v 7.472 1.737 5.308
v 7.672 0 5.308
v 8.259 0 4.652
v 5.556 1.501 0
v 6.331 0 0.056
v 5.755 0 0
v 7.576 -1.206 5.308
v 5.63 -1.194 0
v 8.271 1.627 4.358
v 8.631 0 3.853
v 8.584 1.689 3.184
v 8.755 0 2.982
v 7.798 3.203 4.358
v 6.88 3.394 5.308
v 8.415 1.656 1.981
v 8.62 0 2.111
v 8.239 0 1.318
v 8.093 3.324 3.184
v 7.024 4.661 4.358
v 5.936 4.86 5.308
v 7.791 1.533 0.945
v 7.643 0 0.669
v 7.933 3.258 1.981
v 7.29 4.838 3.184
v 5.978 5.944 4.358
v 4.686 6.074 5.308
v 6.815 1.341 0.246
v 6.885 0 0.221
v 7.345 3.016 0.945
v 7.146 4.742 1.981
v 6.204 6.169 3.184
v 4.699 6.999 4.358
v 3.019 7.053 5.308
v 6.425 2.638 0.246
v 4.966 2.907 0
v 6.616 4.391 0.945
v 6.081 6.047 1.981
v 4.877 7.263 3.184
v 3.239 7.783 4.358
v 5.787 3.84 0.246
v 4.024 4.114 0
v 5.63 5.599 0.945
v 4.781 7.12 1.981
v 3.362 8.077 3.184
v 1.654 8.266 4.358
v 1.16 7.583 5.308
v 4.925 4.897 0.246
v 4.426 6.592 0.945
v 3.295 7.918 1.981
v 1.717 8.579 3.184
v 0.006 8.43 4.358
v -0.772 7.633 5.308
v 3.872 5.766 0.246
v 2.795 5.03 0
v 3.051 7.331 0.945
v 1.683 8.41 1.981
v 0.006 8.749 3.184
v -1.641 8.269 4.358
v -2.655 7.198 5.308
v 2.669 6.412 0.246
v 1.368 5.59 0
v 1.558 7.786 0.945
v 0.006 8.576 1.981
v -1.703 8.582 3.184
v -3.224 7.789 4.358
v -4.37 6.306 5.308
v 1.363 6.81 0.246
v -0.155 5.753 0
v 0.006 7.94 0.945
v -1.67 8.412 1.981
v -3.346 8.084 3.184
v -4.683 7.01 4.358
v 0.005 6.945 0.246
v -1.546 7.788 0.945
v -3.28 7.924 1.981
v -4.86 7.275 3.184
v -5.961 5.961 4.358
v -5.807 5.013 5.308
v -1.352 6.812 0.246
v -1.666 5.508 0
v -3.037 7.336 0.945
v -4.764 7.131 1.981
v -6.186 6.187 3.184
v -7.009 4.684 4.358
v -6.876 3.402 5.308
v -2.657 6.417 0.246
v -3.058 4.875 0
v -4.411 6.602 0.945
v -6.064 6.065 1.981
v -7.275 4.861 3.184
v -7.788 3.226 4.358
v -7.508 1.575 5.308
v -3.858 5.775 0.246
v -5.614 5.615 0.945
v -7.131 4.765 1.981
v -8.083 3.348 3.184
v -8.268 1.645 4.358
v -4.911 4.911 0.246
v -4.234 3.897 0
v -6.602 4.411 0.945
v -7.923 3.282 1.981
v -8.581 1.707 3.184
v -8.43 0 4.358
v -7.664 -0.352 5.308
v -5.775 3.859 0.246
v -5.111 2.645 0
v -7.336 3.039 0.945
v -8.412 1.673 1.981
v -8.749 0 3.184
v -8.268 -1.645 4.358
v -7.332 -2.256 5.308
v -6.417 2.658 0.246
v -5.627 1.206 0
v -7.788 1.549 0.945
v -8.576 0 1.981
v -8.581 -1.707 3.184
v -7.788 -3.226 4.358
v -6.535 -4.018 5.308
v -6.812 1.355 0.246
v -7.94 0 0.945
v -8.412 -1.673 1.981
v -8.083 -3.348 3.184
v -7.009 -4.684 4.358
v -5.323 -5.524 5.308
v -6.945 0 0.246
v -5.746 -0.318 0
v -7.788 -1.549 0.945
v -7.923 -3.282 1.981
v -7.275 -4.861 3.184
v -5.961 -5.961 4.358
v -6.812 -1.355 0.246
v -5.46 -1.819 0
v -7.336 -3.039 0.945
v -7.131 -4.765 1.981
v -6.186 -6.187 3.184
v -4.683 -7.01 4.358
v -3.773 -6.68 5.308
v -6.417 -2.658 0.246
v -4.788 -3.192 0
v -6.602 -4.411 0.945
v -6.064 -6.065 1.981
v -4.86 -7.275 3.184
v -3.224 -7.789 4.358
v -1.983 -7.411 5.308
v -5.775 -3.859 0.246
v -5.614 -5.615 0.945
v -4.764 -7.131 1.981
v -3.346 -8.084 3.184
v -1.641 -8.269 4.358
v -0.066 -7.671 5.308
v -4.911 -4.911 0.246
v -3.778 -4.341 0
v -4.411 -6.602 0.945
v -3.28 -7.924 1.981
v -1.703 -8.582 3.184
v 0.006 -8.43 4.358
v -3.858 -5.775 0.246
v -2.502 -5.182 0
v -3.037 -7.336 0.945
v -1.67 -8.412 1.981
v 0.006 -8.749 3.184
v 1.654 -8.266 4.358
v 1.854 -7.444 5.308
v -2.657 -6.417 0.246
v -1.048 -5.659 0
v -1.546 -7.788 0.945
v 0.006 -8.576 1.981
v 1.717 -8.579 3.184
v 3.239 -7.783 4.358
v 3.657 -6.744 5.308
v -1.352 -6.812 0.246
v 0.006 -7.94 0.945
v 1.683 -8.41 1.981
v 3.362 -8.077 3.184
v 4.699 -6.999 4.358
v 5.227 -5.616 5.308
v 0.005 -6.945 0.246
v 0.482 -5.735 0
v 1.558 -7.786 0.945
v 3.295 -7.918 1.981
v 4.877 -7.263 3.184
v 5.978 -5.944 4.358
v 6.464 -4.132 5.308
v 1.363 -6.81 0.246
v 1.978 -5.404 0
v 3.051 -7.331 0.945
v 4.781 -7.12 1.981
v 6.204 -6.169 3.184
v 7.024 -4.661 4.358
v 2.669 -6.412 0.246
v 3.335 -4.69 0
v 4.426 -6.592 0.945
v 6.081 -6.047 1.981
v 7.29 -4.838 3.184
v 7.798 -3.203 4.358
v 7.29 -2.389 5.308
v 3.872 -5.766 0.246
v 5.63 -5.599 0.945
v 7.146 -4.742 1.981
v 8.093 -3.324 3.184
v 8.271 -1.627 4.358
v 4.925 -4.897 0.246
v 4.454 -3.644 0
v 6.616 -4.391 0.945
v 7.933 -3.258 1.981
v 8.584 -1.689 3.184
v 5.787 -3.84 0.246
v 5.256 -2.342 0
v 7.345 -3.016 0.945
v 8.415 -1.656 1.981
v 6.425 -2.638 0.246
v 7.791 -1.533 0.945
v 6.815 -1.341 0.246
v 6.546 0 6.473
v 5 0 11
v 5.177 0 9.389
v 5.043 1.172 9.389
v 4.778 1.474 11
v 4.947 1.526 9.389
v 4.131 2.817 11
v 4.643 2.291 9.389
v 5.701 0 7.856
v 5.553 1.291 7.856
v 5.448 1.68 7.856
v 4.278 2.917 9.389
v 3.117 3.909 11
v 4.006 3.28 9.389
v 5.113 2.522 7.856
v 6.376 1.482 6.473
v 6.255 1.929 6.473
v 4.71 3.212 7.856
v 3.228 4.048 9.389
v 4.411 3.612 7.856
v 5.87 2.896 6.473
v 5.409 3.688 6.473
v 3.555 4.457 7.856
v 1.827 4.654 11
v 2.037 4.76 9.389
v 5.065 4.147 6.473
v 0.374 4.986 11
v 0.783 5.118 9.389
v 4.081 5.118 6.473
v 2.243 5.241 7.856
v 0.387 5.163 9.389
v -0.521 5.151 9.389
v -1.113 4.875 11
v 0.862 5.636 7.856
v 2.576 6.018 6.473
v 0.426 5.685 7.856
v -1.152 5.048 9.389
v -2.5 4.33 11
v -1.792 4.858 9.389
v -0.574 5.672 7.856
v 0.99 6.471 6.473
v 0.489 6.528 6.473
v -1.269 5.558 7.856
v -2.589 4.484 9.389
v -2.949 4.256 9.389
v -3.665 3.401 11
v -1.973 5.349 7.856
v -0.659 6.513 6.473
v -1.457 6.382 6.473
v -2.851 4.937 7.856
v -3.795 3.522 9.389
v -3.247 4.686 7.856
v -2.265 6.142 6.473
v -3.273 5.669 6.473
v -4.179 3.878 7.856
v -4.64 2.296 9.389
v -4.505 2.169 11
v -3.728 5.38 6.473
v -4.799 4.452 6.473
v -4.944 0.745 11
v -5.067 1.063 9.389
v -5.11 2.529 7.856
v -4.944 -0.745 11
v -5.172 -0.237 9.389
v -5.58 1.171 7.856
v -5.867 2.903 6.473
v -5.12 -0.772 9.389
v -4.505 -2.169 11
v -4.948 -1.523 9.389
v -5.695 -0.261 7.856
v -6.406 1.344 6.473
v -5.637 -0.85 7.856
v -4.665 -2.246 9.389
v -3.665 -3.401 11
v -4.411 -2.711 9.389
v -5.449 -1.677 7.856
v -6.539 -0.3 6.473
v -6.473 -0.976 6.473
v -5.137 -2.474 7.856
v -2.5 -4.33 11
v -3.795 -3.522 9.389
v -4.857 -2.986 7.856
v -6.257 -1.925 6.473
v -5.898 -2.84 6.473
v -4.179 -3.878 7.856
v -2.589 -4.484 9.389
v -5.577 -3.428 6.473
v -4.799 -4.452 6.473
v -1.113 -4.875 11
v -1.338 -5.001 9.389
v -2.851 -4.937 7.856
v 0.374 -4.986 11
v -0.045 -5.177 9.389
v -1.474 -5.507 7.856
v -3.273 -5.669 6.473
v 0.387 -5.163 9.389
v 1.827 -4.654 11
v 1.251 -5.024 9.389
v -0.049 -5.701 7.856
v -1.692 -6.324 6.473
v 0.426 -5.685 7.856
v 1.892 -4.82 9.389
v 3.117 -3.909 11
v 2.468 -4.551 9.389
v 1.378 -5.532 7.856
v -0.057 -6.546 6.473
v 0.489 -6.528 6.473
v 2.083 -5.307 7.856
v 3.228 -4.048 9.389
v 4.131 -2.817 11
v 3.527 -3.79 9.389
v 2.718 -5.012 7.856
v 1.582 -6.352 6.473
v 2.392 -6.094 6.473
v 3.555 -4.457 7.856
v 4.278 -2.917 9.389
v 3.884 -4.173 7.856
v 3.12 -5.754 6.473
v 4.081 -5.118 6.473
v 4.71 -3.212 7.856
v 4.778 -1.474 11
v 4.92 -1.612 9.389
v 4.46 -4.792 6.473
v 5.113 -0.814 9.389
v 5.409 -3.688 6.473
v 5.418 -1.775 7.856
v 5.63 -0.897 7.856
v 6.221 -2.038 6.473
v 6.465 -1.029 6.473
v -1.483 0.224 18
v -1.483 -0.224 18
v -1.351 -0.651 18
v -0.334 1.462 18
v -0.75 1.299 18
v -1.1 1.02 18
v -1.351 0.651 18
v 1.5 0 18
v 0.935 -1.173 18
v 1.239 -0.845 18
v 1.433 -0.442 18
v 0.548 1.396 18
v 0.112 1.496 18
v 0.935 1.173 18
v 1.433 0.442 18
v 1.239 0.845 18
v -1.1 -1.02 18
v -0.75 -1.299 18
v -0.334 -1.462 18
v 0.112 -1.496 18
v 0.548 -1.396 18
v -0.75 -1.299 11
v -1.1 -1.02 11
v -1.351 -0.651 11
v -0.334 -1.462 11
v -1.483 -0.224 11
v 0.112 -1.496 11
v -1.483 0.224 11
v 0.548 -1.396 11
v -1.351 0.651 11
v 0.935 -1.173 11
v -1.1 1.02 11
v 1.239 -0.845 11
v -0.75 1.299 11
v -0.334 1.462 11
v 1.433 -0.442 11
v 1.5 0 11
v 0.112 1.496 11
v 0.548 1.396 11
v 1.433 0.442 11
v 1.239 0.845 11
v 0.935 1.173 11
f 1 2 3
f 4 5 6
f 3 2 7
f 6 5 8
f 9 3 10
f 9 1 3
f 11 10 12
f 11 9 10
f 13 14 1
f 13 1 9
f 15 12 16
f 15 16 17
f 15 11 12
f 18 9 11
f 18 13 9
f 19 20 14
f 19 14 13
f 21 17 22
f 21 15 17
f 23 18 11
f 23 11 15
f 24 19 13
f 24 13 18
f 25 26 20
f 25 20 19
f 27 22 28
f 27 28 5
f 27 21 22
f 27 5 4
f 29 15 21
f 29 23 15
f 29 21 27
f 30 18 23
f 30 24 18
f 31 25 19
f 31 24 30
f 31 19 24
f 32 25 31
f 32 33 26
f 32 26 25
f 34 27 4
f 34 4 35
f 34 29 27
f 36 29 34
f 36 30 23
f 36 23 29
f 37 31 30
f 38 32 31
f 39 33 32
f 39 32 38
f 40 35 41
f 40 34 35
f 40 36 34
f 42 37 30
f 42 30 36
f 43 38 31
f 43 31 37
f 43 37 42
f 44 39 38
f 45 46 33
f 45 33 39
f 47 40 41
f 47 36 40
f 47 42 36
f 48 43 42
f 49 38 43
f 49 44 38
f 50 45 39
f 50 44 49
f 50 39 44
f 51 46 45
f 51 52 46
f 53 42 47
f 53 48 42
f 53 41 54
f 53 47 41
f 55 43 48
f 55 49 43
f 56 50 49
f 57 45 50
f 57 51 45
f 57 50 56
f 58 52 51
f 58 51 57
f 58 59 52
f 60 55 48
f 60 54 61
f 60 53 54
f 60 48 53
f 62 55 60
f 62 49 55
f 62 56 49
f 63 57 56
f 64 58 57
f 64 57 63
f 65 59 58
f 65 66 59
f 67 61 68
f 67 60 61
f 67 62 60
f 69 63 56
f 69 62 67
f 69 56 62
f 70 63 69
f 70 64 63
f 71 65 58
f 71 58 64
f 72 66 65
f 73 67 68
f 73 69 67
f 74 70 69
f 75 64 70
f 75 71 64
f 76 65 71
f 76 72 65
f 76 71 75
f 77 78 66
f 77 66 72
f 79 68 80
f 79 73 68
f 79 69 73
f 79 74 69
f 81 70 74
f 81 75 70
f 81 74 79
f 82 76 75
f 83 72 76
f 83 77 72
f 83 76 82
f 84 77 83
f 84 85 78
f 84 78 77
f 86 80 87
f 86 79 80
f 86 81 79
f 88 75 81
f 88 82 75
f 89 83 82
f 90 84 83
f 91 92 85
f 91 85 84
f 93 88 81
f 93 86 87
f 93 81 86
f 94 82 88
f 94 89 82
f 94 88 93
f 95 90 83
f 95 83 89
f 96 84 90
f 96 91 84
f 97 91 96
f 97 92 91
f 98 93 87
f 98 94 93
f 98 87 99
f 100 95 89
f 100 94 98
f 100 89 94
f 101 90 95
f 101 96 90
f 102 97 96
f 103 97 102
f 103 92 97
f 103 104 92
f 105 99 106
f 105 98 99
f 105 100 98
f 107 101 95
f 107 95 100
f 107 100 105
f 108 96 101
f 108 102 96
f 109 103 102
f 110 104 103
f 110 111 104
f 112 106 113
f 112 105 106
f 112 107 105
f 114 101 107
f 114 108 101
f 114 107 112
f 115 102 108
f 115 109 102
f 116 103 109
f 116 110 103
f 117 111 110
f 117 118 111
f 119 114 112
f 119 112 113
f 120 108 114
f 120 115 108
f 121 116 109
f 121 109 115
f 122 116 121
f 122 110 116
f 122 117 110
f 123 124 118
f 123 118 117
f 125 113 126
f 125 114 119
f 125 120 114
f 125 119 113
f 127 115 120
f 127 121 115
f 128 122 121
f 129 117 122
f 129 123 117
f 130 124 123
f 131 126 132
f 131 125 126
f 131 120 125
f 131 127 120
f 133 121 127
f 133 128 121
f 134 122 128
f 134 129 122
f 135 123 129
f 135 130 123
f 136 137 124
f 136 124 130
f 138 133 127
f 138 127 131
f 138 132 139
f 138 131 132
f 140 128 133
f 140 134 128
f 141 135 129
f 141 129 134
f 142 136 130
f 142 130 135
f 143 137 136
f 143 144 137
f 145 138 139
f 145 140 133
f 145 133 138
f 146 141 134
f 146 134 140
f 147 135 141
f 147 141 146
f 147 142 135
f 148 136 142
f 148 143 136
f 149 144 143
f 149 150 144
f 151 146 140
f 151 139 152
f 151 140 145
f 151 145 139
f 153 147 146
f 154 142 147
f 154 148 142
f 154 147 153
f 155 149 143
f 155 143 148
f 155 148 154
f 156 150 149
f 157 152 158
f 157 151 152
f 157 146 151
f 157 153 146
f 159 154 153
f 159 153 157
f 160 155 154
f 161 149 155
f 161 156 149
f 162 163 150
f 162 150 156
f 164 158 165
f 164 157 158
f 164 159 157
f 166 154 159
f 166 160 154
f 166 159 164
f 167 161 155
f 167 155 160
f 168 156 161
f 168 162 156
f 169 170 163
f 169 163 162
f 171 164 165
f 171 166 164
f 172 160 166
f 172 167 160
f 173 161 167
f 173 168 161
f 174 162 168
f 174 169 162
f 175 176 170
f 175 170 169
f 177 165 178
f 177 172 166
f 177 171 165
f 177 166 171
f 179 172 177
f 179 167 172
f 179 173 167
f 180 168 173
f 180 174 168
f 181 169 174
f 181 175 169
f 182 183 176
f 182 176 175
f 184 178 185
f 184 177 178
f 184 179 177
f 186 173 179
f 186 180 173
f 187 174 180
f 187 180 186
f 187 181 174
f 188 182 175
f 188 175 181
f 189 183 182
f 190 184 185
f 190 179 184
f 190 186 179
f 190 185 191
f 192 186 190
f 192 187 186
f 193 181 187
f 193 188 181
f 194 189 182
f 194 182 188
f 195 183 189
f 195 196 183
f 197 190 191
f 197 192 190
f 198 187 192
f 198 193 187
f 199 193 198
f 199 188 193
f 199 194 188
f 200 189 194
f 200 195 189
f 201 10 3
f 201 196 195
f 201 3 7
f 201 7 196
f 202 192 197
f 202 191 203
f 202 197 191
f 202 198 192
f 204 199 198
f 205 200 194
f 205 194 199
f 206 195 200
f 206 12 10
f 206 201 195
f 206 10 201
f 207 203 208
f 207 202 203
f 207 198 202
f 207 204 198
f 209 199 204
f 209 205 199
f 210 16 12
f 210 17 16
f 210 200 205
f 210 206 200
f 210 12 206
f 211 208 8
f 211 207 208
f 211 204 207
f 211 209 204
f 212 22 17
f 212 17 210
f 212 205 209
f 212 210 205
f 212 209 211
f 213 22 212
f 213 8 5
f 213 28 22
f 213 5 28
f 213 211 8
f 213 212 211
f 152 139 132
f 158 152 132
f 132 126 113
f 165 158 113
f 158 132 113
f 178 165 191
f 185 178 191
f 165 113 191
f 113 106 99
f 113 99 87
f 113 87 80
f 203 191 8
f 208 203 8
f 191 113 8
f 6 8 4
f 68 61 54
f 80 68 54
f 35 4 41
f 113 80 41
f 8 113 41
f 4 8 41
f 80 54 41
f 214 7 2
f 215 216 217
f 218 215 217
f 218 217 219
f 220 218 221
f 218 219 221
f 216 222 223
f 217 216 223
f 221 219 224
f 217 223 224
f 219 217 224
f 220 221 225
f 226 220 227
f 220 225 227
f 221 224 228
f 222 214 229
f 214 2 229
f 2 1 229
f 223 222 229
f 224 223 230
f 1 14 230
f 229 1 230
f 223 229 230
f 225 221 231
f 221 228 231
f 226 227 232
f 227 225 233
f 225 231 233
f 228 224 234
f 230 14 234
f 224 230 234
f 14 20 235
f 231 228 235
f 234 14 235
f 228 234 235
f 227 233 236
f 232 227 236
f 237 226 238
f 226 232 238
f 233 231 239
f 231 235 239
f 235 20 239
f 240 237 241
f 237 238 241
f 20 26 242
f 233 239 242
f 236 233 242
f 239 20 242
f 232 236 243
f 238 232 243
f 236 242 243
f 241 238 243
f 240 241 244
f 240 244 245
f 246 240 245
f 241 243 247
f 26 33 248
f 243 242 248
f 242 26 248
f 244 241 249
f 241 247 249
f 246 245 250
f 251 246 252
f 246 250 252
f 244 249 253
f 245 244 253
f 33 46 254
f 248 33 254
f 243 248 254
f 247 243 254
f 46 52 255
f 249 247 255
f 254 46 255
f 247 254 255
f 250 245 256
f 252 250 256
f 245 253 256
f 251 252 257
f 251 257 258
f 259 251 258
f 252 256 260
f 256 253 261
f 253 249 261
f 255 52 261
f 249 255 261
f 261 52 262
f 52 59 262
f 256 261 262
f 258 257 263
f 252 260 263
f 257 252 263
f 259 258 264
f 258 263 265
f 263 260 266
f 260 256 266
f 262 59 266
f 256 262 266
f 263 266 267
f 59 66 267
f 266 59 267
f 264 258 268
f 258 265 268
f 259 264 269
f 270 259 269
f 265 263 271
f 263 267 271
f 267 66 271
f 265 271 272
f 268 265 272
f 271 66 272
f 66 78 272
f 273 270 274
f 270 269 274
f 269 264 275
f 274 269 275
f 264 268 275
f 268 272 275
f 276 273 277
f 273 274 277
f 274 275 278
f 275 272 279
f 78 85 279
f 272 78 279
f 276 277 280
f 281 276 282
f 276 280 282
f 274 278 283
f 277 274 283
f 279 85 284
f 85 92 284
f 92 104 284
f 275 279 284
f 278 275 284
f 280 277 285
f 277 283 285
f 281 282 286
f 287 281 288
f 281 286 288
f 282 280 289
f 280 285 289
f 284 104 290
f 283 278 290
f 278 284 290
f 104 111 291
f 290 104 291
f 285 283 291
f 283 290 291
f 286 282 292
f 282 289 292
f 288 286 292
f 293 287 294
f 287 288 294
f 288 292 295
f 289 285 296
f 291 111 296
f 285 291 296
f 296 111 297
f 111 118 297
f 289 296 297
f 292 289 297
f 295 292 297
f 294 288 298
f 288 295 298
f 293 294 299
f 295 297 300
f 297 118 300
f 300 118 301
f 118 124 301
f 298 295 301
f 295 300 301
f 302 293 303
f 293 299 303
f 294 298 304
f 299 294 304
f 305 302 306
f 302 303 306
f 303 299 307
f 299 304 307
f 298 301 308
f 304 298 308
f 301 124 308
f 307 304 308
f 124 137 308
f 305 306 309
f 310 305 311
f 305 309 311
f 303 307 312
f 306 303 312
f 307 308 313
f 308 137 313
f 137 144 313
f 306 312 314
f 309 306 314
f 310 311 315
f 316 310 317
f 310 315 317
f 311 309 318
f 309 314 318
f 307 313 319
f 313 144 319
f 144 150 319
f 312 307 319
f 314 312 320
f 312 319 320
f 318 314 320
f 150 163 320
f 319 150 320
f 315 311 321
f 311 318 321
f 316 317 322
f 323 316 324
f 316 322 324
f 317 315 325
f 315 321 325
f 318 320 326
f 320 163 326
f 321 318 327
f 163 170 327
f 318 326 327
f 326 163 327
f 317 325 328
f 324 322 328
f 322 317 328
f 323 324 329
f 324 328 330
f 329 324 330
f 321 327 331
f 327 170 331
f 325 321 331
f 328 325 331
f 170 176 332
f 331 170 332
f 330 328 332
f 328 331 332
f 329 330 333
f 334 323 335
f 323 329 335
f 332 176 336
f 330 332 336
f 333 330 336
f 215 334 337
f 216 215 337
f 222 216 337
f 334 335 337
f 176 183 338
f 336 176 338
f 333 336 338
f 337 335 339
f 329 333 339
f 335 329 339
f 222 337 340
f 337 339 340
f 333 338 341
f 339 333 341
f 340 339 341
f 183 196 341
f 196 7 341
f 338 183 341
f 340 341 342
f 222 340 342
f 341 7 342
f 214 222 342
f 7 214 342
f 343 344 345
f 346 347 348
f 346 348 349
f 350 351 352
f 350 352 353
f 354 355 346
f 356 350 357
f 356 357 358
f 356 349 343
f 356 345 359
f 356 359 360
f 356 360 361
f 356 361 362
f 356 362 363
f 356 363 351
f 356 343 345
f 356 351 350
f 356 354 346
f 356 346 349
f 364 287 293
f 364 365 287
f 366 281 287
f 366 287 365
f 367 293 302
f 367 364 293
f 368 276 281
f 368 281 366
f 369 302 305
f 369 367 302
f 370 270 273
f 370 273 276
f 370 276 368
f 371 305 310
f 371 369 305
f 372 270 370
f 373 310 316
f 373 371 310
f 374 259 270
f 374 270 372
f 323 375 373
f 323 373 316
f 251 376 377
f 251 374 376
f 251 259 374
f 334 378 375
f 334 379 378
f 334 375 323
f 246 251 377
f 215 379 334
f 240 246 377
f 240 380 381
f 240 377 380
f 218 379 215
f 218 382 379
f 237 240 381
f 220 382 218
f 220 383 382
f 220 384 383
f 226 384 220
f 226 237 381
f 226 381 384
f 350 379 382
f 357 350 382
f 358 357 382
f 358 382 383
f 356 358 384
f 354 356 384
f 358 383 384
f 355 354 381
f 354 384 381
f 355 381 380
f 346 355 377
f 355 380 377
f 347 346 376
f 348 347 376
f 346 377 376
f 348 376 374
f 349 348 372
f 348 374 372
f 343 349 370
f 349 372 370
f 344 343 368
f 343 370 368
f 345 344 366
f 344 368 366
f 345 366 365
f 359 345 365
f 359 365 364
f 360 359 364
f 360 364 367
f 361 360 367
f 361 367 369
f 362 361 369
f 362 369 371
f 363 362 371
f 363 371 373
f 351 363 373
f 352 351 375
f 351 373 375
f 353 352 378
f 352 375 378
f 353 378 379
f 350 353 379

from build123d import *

# Parameters (mm, degrees)
SKETCH1_R           = 10
BOSS_EXTRUDE1_DEPTH = 4
SKETCH2_R           = 5
BOSS_EXTRUDE2_DEPTH = 7
SKETCH3_R           = 1.5
BOSS_EXTRUDE3_DEPTH = 7
FILLET4_R           = 7.4
FILLET15_R          = 4.2
FILLET16_R          = 3


with BuildPart() as part:
    # Sketch1 → Boss-Extrude1 (new body)
    with BuildSketch(Plane.XY):
        Circle(SKETCH1_R)
    extrude(amount=BOSS_EXTRUDE1_DEPTH)

    # Sketch2 → Boss-Extrude2 (add)
    with BuildSketch(Plane.XY.offset(4)):
        Circle(SKETCH2_R)
    extrude(amount=BOSS_EXTRUDE2_DEPTH)

    # Sketch3 → Boss-Extrude3 (add)
    with BuildSketch(Plane.XY.offset(11)):
        Circle(SKETCH3_R)
    extrude(amount=BOSS_EXTRUDE3_DEPTH)

    # Fillet4
    # the kernel refuses this fillet: 7.4 mm, written as the material it adds along each edge
    with BuildSketch(Plane(origin=(0, 0, 4), x_dir=(1, 0, 0), z_dir=(0, -1, 0))) as fillet4_piece_1:
        with BuildLine():
            CenterArc((12.4, 7), FILLET4_R, 180, 71.075355584)
            Line((5, 7), (4.852, 7))
            Line((4.852, 7), (4.852, 0))
            Line((4.852, 0), (5, -0.148))
            ThreePointArc((5, -0.148), (7.5, -0.148), (9.952, -0.14))
            Line((9.952, -0.14), (10, 0))
        make_face()
    revolve(axis=Axis((0, 0, 4), (0, 0, 1)))

    # Fillet15
    # the kernel refuses this fillet: 4.2 mm, written as the material it takes off along each edge
    with BuildSketch(Plane(origin=(0, 0, 0), x_dir=(1, 0, 0), z_dir=(0, -1, 0))) as fillet15_piece_1:
        with BuildLine():
            CenterArc((5.804764607, 4.2), FILLET15_R, 270, 87.270597363)
            Line((5.804764607, 0), (5.804764607, -0.084))
            Line((5.804764607, -0.084), (10, -0.084))
            Line((10, -0.084), (10.084, 0))
            ThreePointArc((10.084, 0), (10.084, 2), (10.083904708, 3.996))
            Line((10.083904708, 3.996), (10, 4))
        make_face()
    revolve(axis=Axis((0, 0, 0), (0, 0, 1)), mode=Mode.SUBTRACT)

    # Fillet16
    fillet16_edges = [part.edges().sort_by_distance(p)[0] for p in [
        (-10, 0, 4),
    ]]
    fillet(fillet16_edges, radius=FILLET16_R)


solid = part.part
